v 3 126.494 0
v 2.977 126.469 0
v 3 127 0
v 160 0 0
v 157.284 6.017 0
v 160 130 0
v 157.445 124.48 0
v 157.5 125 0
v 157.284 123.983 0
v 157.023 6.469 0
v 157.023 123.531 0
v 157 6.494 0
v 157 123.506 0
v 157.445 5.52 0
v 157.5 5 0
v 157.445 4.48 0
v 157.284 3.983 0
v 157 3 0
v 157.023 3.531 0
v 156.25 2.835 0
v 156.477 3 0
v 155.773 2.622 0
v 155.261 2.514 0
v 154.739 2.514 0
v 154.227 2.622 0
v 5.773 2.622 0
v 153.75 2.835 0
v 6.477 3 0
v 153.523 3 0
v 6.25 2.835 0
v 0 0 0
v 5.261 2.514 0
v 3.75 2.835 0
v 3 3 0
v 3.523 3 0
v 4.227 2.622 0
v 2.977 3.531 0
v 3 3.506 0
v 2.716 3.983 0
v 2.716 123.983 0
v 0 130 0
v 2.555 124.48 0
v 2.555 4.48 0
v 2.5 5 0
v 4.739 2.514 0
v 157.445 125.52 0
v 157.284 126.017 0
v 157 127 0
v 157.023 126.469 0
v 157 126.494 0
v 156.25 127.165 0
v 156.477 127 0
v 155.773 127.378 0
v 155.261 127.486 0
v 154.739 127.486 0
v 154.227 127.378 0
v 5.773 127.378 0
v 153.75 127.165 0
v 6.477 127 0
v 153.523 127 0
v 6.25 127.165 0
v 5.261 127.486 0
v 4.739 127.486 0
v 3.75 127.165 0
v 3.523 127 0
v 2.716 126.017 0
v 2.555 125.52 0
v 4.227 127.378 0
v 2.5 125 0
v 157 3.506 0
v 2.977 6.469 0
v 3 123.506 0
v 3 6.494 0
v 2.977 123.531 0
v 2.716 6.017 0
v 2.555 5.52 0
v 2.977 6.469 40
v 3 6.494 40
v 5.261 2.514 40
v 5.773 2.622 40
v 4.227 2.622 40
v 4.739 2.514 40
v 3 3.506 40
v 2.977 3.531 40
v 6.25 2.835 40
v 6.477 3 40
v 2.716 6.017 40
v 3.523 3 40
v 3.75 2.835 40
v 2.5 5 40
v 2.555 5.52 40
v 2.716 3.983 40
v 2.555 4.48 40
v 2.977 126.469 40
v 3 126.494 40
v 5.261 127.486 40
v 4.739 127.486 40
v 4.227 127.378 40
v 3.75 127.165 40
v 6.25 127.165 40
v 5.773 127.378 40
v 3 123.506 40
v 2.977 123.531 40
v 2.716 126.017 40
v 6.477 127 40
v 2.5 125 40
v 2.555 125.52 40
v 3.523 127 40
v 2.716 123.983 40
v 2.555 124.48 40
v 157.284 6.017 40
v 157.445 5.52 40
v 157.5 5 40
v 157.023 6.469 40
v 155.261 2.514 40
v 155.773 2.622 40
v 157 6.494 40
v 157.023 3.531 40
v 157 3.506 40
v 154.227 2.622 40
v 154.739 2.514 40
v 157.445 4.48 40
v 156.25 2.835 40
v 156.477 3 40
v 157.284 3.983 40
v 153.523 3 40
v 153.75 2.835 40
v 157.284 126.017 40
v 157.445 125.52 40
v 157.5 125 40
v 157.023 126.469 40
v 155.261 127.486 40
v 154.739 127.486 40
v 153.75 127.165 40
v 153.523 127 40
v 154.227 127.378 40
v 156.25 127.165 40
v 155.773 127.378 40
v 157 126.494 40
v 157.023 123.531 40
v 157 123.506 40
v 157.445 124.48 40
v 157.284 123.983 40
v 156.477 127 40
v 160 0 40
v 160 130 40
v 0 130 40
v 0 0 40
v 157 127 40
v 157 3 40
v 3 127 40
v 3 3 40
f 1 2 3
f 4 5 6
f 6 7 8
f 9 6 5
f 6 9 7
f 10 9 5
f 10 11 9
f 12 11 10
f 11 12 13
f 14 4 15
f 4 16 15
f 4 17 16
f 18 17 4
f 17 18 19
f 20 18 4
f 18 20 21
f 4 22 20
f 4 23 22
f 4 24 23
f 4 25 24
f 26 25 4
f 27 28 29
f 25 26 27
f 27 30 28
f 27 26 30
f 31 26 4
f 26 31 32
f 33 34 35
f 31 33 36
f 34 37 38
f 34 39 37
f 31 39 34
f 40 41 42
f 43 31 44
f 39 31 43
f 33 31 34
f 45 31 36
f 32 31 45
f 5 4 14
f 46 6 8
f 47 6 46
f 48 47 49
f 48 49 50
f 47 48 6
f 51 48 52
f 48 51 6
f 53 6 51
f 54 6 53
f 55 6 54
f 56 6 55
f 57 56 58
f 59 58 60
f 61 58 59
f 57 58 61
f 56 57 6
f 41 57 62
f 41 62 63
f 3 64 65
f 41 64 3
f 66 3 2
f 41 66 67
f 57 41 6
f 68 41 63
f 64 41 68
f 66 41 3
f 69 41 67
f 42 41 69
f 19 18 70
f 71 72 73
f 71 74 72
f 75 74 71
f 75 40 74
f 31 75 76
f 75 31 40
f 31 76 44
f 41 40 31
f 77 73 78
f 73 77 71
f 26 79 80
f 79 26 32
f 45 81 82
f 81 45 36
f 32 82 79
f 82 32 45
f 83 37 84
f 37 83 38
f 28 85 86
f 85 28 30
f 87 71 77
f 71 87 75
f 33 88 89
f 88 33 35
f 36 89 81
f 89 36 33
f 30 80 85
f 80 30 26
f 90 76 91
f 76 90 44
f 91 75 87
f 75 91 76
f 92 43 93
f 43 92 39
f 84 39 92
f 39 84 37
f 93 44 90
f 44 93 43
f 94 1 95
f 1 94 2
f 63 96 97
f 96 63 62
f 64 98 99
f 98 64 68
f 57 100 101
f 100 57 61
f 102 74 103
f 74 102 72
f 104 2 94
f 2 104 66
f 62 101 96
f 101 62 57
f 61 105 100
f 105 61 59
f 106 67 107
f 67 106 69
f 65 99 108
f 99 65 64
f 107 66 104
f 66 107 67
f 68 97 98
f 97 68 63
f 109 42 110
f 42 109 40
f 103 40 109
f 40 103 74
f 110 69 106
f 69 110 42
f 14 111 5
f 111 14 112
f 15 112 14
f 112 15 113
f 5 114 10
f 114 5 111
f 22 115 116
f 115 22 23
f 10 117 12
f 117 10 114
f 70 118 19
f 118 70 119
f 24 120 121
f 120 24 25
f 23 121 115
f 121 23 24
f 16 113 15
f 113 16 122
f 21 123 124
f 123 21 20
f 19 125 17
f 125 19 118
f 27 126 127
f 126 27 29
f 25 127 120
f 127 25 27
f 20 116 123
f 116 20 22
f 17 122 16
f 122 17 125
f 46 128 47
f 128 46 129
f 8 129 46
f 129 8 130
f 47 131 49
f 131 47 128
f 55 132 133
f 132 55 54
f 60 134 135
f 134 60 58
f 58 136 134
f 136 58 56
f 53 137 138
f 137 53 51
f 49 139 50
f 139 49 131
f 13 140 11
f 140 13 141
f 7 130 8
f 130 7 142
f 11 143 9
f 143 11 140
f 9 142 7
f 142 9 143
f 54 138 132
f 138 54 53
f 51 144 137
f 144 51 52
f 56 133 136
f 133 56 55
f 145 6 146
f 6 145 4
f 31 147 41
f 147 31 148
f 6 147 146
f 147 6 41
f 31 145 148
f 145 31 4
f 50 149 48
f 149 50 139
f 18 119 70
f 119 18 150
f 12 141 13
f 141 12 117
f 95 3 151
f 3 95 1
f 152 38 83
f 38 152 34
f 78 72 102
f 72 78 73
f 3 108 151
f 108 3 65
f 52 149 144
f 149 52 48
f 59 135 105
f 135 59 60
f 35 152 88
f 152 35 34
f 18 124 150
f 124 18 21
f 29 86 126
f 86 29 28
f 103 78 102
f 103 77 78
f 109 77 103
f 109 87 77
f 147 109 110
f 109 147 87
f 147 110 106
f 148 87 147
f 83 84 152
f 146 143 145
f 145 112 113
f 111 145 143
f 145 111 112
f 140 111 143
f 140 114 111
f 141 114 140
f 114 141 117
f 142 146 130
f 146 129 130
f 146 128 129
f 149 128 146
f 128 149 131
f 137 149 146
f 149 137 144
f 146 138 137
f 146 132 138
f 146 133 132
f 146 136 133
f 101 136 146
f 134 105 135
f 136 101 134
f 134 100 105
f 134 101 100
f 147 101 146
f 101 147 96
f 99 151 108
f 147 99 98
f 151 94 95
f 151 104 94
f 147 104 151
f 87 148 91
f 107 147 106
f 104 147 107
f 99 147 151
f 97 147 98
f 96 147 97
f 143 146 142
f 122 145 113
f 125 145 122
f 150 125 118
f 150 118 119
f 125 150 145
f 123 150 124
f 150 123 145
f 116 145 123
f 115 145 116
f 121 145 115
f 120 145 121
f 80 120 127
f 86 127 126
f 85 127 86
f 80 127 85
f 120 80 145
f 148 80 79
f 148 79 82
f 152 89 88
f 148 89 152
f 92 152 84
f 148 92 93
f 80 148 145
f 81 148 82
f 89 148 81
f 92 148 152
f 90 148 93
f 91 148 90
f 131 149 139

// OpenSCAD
// Agri-Bot Compact Plain Chassis in OpenSCAD
// Minimum size 2-layer structure with vertical expandability

//////////////////// PARAMETERS ////////////////////
length = 160;     // Minimized length to fit all components
width = 130;      // Minimized width to fit all components
frameHeight = 20; // 2cm frame height for each layer
wallThickness = 3;
screwHoleRadius = 2.5;
screwInset = 5;

//////////////////// MODULES ////////////////////

module screwHoles() {
  for (x = [screwInset, length - screwInset])
    for (y = [screwInset, width - screwInset])
      translate([x, y, 0])
        cylinder(h = frameHeight + 1, r = screwHoleRadius, $fn = 30);
}

module layerFrame() {
  difference() {
    cube([length, width, frameHeight]);

    // Hollow out the inside
    translate([wallThickness, wallThickness, 0])
      cube([length - 2 * wallThickness, width - 2 * wallThickness, frameHeight]);

    // Screw holes in four corners
    screwHoles();
  }
}

//////////////////// ASSEMBLY ////////////////////

translate([0, 0, 0])
  layerFrame();

translate([0, 0, frameHeight])
  layerFrame();

// Optional: you can stack more frames by adding more translate([...]) layerFrame();
